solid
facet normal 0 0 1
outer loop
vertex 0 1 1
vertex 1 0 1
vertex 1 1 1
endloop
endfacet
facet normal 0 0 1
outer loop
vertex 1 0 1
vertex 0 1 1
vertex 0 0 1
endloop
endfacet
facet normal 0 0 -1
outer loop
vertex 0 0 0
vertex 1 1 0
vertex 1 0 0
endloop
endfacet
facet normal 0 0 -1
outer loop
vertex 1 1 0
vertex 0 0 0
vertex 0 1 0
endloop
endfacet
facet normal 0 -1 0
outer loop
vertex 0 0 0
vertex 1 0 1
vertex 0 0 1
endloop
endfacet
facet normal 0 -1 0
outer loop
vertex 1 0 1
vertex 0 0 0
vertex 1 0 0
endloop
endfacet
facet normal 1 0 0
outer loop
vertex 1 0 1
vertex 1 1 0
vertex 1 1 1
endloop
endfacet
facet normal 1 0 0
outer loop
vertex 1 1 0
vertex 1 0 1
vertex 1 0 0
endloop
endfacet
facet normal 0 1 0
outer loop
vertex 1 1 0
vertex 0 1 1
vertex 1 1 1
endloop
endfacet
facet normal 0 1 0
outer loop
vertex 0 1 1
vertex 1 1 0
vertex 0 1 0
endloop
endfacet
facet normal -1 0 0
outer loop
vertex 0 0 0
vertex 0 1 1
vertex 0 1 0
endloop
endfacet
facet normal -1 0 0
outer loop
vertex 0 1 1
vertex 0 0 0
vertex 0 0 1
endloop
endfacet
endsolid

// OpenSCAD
/* Guardas de altura, curso e forca do modulo Z. Resultado: um cubo de 1 mm. */
include <00_Parametros.scad>;

tip_down=z_plunger_down_z+pen_tip_uncompressed_z+nominal_compression;
tip_up=z_plunger_down_z+Z_UP+pen_tip_uncompressed_z;
force_nominal=spring_rate_target*(spring_preload+nominal_compression);
force_max=spring_rate_target*(spring_preload+compliance_travel);
guide_overlap_up=z_guide_total_h-(z_plunger_down_z-y_beam_top_z+Z_UP);

assert(abs(tip_down-(paper_z+paper_thickness)) < 0.001,
       "Ponta baixa nao coincide com a superficie do papel");
assert(abs((tip_up-tip_down)-pen_lift_clearance) < 0.001,
       "Elevacao livre da caneta diferente de 6 mm");
assert(force_nominal >= 0.3 && force_nominal <= 0.7,
       "Forca nominal fora da faixa segura de desenho");
assert(force_max <= 0.9,
       "Forca maxima pode marcar/rasgar papel fino");
assert(guide_overlap_up >= 12,
       "Embolo Z perde comprimento de guia na posicao alta");

cube([1,1,1]);
